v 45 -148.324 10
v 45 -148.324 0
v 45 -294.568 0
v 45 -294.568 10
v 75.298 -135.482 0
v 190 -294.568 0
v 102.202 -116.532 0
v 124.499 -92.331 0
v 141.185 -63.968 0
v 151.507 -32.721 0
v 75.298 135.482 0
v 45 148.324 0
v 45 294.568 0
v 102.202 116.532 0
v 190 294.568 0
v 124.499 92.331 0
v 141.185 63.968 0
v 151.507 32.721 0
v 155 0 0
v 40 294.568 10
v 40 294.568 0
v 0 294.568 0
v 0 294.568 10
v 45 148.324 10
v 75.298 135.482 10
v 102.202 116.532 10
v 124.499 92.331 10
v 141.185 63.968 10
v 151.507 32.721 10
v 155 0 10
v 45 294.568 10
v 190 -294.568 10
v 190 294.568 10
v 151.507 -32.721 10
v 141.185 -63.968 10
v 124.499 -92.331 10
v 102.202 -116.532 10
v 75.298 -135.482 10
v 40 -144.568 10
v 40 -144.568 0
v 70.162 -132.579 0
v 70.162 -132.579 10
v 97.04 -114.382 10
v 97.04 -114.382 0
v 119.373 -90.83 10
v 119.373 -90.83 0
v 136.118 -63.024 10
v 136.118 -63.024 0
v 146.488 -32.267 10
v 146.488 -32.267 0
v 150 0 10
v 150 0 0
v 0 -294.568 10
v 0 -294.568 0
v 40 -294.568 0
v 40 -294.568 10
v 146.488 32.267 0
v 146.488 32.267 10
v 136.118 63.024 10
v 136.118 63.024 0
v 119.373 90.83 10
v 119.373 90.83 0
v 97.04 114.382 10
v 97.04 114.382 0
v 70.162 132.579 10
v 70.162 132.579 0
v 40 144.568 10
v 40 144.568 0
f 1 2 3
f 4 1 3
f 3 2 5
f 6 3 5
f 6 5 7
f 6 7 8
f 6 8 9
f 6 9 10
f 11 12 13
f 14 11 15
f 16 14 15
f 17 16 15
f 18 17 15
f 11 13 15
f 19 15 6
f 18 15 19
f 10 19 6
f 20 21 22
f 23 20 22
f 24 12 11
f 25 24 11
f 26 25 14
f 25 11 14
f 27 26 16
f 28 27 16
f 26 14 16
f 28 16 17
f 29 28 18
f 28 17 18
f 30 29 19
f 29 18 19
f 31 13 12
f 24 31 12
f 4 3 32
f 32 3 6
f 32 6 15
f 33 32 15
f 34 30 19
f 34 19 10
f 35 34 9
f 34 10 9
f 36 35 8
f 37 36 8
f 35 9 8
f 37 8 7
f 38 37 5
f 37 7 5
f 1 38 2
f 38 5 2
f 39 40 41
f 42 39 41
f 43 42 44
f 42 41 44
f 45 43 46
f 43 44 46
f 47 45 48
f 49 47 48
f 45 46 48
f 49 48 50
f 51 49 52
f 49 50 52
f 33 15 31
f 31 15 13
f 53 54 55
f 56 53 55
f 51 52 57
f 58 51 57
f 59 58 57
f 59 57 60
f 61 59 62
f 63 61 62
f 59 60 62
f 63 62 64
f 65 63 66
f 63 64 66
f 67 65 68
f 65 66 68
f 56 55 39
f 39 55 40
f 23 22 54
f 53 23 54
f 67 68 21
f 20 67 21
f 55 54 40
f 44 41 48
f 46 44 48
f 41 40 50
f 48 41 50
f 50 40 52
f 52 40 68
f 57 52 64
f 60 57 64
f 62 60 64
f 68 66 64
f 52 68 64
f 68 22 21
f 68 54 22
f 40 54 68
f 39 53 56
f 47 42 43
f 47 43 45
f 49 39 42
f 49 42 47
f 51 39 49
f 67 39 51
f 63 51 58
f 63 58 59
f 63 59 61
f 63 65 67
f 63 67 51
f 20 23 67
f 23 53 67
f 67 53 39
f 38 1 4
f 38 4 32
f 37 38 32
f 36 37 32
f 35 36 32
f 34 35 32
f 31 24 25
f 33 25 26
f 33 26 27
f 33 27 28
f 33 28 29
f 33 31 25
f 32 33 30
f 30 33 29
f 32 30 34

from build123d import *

# Parameters (mm, degrees)
F1_DEPTH = 10


with BuildPart() as f1:
    # F0 (on Top) → F1 (new body)
    with BuildSketch(Plane.XY):
        with BuildLine():
            Line((0, 294.568323), (0, 0))
            Line((0, 0), (40, 0))
            Line((40, 0), (150, 0))
            ThreePointArc((150, 0), (119.373364, 90.829511), (40, 144.568323))
            Line((40, 144.568323), (40, 294.568323))
            Line((40, 294.568323), (0, 294.568323))
        make_face()
        with BuildLine():
            ThreePointArc((45, 148.32397), (124.498996, 92.330927), (155, 0))
            ThreePointArc((155, 0), (124.498996, -92.330927), (45, -148.32397))
            Line((45, -148.32397), (45, -294.568323))
            Line((45, -294.568323), (190, -294.568323))
            Line((190, -294.568323), (190, 294.568323))
            Line((190, 294.568323), (45, 294.568323))
            Line((45, 294.568323), (45, 148.32397))
        make_face()
        with BuildLine():
            Line((40, 0), (0, 0))
            Line((0, 0), (0, -294.568323))
            Line((0, -294.568323), (40, -294.568323))
            Line((40, -294.568323), (40, -144.568323))
            ThreePointArc((40, -144.568323), (119.373364, -90.829511), (150, 0))
            Line((150, 0), (40, 0))
        make_face()
    extrude(amount=F1_DEPTH)


solid = f1.part
